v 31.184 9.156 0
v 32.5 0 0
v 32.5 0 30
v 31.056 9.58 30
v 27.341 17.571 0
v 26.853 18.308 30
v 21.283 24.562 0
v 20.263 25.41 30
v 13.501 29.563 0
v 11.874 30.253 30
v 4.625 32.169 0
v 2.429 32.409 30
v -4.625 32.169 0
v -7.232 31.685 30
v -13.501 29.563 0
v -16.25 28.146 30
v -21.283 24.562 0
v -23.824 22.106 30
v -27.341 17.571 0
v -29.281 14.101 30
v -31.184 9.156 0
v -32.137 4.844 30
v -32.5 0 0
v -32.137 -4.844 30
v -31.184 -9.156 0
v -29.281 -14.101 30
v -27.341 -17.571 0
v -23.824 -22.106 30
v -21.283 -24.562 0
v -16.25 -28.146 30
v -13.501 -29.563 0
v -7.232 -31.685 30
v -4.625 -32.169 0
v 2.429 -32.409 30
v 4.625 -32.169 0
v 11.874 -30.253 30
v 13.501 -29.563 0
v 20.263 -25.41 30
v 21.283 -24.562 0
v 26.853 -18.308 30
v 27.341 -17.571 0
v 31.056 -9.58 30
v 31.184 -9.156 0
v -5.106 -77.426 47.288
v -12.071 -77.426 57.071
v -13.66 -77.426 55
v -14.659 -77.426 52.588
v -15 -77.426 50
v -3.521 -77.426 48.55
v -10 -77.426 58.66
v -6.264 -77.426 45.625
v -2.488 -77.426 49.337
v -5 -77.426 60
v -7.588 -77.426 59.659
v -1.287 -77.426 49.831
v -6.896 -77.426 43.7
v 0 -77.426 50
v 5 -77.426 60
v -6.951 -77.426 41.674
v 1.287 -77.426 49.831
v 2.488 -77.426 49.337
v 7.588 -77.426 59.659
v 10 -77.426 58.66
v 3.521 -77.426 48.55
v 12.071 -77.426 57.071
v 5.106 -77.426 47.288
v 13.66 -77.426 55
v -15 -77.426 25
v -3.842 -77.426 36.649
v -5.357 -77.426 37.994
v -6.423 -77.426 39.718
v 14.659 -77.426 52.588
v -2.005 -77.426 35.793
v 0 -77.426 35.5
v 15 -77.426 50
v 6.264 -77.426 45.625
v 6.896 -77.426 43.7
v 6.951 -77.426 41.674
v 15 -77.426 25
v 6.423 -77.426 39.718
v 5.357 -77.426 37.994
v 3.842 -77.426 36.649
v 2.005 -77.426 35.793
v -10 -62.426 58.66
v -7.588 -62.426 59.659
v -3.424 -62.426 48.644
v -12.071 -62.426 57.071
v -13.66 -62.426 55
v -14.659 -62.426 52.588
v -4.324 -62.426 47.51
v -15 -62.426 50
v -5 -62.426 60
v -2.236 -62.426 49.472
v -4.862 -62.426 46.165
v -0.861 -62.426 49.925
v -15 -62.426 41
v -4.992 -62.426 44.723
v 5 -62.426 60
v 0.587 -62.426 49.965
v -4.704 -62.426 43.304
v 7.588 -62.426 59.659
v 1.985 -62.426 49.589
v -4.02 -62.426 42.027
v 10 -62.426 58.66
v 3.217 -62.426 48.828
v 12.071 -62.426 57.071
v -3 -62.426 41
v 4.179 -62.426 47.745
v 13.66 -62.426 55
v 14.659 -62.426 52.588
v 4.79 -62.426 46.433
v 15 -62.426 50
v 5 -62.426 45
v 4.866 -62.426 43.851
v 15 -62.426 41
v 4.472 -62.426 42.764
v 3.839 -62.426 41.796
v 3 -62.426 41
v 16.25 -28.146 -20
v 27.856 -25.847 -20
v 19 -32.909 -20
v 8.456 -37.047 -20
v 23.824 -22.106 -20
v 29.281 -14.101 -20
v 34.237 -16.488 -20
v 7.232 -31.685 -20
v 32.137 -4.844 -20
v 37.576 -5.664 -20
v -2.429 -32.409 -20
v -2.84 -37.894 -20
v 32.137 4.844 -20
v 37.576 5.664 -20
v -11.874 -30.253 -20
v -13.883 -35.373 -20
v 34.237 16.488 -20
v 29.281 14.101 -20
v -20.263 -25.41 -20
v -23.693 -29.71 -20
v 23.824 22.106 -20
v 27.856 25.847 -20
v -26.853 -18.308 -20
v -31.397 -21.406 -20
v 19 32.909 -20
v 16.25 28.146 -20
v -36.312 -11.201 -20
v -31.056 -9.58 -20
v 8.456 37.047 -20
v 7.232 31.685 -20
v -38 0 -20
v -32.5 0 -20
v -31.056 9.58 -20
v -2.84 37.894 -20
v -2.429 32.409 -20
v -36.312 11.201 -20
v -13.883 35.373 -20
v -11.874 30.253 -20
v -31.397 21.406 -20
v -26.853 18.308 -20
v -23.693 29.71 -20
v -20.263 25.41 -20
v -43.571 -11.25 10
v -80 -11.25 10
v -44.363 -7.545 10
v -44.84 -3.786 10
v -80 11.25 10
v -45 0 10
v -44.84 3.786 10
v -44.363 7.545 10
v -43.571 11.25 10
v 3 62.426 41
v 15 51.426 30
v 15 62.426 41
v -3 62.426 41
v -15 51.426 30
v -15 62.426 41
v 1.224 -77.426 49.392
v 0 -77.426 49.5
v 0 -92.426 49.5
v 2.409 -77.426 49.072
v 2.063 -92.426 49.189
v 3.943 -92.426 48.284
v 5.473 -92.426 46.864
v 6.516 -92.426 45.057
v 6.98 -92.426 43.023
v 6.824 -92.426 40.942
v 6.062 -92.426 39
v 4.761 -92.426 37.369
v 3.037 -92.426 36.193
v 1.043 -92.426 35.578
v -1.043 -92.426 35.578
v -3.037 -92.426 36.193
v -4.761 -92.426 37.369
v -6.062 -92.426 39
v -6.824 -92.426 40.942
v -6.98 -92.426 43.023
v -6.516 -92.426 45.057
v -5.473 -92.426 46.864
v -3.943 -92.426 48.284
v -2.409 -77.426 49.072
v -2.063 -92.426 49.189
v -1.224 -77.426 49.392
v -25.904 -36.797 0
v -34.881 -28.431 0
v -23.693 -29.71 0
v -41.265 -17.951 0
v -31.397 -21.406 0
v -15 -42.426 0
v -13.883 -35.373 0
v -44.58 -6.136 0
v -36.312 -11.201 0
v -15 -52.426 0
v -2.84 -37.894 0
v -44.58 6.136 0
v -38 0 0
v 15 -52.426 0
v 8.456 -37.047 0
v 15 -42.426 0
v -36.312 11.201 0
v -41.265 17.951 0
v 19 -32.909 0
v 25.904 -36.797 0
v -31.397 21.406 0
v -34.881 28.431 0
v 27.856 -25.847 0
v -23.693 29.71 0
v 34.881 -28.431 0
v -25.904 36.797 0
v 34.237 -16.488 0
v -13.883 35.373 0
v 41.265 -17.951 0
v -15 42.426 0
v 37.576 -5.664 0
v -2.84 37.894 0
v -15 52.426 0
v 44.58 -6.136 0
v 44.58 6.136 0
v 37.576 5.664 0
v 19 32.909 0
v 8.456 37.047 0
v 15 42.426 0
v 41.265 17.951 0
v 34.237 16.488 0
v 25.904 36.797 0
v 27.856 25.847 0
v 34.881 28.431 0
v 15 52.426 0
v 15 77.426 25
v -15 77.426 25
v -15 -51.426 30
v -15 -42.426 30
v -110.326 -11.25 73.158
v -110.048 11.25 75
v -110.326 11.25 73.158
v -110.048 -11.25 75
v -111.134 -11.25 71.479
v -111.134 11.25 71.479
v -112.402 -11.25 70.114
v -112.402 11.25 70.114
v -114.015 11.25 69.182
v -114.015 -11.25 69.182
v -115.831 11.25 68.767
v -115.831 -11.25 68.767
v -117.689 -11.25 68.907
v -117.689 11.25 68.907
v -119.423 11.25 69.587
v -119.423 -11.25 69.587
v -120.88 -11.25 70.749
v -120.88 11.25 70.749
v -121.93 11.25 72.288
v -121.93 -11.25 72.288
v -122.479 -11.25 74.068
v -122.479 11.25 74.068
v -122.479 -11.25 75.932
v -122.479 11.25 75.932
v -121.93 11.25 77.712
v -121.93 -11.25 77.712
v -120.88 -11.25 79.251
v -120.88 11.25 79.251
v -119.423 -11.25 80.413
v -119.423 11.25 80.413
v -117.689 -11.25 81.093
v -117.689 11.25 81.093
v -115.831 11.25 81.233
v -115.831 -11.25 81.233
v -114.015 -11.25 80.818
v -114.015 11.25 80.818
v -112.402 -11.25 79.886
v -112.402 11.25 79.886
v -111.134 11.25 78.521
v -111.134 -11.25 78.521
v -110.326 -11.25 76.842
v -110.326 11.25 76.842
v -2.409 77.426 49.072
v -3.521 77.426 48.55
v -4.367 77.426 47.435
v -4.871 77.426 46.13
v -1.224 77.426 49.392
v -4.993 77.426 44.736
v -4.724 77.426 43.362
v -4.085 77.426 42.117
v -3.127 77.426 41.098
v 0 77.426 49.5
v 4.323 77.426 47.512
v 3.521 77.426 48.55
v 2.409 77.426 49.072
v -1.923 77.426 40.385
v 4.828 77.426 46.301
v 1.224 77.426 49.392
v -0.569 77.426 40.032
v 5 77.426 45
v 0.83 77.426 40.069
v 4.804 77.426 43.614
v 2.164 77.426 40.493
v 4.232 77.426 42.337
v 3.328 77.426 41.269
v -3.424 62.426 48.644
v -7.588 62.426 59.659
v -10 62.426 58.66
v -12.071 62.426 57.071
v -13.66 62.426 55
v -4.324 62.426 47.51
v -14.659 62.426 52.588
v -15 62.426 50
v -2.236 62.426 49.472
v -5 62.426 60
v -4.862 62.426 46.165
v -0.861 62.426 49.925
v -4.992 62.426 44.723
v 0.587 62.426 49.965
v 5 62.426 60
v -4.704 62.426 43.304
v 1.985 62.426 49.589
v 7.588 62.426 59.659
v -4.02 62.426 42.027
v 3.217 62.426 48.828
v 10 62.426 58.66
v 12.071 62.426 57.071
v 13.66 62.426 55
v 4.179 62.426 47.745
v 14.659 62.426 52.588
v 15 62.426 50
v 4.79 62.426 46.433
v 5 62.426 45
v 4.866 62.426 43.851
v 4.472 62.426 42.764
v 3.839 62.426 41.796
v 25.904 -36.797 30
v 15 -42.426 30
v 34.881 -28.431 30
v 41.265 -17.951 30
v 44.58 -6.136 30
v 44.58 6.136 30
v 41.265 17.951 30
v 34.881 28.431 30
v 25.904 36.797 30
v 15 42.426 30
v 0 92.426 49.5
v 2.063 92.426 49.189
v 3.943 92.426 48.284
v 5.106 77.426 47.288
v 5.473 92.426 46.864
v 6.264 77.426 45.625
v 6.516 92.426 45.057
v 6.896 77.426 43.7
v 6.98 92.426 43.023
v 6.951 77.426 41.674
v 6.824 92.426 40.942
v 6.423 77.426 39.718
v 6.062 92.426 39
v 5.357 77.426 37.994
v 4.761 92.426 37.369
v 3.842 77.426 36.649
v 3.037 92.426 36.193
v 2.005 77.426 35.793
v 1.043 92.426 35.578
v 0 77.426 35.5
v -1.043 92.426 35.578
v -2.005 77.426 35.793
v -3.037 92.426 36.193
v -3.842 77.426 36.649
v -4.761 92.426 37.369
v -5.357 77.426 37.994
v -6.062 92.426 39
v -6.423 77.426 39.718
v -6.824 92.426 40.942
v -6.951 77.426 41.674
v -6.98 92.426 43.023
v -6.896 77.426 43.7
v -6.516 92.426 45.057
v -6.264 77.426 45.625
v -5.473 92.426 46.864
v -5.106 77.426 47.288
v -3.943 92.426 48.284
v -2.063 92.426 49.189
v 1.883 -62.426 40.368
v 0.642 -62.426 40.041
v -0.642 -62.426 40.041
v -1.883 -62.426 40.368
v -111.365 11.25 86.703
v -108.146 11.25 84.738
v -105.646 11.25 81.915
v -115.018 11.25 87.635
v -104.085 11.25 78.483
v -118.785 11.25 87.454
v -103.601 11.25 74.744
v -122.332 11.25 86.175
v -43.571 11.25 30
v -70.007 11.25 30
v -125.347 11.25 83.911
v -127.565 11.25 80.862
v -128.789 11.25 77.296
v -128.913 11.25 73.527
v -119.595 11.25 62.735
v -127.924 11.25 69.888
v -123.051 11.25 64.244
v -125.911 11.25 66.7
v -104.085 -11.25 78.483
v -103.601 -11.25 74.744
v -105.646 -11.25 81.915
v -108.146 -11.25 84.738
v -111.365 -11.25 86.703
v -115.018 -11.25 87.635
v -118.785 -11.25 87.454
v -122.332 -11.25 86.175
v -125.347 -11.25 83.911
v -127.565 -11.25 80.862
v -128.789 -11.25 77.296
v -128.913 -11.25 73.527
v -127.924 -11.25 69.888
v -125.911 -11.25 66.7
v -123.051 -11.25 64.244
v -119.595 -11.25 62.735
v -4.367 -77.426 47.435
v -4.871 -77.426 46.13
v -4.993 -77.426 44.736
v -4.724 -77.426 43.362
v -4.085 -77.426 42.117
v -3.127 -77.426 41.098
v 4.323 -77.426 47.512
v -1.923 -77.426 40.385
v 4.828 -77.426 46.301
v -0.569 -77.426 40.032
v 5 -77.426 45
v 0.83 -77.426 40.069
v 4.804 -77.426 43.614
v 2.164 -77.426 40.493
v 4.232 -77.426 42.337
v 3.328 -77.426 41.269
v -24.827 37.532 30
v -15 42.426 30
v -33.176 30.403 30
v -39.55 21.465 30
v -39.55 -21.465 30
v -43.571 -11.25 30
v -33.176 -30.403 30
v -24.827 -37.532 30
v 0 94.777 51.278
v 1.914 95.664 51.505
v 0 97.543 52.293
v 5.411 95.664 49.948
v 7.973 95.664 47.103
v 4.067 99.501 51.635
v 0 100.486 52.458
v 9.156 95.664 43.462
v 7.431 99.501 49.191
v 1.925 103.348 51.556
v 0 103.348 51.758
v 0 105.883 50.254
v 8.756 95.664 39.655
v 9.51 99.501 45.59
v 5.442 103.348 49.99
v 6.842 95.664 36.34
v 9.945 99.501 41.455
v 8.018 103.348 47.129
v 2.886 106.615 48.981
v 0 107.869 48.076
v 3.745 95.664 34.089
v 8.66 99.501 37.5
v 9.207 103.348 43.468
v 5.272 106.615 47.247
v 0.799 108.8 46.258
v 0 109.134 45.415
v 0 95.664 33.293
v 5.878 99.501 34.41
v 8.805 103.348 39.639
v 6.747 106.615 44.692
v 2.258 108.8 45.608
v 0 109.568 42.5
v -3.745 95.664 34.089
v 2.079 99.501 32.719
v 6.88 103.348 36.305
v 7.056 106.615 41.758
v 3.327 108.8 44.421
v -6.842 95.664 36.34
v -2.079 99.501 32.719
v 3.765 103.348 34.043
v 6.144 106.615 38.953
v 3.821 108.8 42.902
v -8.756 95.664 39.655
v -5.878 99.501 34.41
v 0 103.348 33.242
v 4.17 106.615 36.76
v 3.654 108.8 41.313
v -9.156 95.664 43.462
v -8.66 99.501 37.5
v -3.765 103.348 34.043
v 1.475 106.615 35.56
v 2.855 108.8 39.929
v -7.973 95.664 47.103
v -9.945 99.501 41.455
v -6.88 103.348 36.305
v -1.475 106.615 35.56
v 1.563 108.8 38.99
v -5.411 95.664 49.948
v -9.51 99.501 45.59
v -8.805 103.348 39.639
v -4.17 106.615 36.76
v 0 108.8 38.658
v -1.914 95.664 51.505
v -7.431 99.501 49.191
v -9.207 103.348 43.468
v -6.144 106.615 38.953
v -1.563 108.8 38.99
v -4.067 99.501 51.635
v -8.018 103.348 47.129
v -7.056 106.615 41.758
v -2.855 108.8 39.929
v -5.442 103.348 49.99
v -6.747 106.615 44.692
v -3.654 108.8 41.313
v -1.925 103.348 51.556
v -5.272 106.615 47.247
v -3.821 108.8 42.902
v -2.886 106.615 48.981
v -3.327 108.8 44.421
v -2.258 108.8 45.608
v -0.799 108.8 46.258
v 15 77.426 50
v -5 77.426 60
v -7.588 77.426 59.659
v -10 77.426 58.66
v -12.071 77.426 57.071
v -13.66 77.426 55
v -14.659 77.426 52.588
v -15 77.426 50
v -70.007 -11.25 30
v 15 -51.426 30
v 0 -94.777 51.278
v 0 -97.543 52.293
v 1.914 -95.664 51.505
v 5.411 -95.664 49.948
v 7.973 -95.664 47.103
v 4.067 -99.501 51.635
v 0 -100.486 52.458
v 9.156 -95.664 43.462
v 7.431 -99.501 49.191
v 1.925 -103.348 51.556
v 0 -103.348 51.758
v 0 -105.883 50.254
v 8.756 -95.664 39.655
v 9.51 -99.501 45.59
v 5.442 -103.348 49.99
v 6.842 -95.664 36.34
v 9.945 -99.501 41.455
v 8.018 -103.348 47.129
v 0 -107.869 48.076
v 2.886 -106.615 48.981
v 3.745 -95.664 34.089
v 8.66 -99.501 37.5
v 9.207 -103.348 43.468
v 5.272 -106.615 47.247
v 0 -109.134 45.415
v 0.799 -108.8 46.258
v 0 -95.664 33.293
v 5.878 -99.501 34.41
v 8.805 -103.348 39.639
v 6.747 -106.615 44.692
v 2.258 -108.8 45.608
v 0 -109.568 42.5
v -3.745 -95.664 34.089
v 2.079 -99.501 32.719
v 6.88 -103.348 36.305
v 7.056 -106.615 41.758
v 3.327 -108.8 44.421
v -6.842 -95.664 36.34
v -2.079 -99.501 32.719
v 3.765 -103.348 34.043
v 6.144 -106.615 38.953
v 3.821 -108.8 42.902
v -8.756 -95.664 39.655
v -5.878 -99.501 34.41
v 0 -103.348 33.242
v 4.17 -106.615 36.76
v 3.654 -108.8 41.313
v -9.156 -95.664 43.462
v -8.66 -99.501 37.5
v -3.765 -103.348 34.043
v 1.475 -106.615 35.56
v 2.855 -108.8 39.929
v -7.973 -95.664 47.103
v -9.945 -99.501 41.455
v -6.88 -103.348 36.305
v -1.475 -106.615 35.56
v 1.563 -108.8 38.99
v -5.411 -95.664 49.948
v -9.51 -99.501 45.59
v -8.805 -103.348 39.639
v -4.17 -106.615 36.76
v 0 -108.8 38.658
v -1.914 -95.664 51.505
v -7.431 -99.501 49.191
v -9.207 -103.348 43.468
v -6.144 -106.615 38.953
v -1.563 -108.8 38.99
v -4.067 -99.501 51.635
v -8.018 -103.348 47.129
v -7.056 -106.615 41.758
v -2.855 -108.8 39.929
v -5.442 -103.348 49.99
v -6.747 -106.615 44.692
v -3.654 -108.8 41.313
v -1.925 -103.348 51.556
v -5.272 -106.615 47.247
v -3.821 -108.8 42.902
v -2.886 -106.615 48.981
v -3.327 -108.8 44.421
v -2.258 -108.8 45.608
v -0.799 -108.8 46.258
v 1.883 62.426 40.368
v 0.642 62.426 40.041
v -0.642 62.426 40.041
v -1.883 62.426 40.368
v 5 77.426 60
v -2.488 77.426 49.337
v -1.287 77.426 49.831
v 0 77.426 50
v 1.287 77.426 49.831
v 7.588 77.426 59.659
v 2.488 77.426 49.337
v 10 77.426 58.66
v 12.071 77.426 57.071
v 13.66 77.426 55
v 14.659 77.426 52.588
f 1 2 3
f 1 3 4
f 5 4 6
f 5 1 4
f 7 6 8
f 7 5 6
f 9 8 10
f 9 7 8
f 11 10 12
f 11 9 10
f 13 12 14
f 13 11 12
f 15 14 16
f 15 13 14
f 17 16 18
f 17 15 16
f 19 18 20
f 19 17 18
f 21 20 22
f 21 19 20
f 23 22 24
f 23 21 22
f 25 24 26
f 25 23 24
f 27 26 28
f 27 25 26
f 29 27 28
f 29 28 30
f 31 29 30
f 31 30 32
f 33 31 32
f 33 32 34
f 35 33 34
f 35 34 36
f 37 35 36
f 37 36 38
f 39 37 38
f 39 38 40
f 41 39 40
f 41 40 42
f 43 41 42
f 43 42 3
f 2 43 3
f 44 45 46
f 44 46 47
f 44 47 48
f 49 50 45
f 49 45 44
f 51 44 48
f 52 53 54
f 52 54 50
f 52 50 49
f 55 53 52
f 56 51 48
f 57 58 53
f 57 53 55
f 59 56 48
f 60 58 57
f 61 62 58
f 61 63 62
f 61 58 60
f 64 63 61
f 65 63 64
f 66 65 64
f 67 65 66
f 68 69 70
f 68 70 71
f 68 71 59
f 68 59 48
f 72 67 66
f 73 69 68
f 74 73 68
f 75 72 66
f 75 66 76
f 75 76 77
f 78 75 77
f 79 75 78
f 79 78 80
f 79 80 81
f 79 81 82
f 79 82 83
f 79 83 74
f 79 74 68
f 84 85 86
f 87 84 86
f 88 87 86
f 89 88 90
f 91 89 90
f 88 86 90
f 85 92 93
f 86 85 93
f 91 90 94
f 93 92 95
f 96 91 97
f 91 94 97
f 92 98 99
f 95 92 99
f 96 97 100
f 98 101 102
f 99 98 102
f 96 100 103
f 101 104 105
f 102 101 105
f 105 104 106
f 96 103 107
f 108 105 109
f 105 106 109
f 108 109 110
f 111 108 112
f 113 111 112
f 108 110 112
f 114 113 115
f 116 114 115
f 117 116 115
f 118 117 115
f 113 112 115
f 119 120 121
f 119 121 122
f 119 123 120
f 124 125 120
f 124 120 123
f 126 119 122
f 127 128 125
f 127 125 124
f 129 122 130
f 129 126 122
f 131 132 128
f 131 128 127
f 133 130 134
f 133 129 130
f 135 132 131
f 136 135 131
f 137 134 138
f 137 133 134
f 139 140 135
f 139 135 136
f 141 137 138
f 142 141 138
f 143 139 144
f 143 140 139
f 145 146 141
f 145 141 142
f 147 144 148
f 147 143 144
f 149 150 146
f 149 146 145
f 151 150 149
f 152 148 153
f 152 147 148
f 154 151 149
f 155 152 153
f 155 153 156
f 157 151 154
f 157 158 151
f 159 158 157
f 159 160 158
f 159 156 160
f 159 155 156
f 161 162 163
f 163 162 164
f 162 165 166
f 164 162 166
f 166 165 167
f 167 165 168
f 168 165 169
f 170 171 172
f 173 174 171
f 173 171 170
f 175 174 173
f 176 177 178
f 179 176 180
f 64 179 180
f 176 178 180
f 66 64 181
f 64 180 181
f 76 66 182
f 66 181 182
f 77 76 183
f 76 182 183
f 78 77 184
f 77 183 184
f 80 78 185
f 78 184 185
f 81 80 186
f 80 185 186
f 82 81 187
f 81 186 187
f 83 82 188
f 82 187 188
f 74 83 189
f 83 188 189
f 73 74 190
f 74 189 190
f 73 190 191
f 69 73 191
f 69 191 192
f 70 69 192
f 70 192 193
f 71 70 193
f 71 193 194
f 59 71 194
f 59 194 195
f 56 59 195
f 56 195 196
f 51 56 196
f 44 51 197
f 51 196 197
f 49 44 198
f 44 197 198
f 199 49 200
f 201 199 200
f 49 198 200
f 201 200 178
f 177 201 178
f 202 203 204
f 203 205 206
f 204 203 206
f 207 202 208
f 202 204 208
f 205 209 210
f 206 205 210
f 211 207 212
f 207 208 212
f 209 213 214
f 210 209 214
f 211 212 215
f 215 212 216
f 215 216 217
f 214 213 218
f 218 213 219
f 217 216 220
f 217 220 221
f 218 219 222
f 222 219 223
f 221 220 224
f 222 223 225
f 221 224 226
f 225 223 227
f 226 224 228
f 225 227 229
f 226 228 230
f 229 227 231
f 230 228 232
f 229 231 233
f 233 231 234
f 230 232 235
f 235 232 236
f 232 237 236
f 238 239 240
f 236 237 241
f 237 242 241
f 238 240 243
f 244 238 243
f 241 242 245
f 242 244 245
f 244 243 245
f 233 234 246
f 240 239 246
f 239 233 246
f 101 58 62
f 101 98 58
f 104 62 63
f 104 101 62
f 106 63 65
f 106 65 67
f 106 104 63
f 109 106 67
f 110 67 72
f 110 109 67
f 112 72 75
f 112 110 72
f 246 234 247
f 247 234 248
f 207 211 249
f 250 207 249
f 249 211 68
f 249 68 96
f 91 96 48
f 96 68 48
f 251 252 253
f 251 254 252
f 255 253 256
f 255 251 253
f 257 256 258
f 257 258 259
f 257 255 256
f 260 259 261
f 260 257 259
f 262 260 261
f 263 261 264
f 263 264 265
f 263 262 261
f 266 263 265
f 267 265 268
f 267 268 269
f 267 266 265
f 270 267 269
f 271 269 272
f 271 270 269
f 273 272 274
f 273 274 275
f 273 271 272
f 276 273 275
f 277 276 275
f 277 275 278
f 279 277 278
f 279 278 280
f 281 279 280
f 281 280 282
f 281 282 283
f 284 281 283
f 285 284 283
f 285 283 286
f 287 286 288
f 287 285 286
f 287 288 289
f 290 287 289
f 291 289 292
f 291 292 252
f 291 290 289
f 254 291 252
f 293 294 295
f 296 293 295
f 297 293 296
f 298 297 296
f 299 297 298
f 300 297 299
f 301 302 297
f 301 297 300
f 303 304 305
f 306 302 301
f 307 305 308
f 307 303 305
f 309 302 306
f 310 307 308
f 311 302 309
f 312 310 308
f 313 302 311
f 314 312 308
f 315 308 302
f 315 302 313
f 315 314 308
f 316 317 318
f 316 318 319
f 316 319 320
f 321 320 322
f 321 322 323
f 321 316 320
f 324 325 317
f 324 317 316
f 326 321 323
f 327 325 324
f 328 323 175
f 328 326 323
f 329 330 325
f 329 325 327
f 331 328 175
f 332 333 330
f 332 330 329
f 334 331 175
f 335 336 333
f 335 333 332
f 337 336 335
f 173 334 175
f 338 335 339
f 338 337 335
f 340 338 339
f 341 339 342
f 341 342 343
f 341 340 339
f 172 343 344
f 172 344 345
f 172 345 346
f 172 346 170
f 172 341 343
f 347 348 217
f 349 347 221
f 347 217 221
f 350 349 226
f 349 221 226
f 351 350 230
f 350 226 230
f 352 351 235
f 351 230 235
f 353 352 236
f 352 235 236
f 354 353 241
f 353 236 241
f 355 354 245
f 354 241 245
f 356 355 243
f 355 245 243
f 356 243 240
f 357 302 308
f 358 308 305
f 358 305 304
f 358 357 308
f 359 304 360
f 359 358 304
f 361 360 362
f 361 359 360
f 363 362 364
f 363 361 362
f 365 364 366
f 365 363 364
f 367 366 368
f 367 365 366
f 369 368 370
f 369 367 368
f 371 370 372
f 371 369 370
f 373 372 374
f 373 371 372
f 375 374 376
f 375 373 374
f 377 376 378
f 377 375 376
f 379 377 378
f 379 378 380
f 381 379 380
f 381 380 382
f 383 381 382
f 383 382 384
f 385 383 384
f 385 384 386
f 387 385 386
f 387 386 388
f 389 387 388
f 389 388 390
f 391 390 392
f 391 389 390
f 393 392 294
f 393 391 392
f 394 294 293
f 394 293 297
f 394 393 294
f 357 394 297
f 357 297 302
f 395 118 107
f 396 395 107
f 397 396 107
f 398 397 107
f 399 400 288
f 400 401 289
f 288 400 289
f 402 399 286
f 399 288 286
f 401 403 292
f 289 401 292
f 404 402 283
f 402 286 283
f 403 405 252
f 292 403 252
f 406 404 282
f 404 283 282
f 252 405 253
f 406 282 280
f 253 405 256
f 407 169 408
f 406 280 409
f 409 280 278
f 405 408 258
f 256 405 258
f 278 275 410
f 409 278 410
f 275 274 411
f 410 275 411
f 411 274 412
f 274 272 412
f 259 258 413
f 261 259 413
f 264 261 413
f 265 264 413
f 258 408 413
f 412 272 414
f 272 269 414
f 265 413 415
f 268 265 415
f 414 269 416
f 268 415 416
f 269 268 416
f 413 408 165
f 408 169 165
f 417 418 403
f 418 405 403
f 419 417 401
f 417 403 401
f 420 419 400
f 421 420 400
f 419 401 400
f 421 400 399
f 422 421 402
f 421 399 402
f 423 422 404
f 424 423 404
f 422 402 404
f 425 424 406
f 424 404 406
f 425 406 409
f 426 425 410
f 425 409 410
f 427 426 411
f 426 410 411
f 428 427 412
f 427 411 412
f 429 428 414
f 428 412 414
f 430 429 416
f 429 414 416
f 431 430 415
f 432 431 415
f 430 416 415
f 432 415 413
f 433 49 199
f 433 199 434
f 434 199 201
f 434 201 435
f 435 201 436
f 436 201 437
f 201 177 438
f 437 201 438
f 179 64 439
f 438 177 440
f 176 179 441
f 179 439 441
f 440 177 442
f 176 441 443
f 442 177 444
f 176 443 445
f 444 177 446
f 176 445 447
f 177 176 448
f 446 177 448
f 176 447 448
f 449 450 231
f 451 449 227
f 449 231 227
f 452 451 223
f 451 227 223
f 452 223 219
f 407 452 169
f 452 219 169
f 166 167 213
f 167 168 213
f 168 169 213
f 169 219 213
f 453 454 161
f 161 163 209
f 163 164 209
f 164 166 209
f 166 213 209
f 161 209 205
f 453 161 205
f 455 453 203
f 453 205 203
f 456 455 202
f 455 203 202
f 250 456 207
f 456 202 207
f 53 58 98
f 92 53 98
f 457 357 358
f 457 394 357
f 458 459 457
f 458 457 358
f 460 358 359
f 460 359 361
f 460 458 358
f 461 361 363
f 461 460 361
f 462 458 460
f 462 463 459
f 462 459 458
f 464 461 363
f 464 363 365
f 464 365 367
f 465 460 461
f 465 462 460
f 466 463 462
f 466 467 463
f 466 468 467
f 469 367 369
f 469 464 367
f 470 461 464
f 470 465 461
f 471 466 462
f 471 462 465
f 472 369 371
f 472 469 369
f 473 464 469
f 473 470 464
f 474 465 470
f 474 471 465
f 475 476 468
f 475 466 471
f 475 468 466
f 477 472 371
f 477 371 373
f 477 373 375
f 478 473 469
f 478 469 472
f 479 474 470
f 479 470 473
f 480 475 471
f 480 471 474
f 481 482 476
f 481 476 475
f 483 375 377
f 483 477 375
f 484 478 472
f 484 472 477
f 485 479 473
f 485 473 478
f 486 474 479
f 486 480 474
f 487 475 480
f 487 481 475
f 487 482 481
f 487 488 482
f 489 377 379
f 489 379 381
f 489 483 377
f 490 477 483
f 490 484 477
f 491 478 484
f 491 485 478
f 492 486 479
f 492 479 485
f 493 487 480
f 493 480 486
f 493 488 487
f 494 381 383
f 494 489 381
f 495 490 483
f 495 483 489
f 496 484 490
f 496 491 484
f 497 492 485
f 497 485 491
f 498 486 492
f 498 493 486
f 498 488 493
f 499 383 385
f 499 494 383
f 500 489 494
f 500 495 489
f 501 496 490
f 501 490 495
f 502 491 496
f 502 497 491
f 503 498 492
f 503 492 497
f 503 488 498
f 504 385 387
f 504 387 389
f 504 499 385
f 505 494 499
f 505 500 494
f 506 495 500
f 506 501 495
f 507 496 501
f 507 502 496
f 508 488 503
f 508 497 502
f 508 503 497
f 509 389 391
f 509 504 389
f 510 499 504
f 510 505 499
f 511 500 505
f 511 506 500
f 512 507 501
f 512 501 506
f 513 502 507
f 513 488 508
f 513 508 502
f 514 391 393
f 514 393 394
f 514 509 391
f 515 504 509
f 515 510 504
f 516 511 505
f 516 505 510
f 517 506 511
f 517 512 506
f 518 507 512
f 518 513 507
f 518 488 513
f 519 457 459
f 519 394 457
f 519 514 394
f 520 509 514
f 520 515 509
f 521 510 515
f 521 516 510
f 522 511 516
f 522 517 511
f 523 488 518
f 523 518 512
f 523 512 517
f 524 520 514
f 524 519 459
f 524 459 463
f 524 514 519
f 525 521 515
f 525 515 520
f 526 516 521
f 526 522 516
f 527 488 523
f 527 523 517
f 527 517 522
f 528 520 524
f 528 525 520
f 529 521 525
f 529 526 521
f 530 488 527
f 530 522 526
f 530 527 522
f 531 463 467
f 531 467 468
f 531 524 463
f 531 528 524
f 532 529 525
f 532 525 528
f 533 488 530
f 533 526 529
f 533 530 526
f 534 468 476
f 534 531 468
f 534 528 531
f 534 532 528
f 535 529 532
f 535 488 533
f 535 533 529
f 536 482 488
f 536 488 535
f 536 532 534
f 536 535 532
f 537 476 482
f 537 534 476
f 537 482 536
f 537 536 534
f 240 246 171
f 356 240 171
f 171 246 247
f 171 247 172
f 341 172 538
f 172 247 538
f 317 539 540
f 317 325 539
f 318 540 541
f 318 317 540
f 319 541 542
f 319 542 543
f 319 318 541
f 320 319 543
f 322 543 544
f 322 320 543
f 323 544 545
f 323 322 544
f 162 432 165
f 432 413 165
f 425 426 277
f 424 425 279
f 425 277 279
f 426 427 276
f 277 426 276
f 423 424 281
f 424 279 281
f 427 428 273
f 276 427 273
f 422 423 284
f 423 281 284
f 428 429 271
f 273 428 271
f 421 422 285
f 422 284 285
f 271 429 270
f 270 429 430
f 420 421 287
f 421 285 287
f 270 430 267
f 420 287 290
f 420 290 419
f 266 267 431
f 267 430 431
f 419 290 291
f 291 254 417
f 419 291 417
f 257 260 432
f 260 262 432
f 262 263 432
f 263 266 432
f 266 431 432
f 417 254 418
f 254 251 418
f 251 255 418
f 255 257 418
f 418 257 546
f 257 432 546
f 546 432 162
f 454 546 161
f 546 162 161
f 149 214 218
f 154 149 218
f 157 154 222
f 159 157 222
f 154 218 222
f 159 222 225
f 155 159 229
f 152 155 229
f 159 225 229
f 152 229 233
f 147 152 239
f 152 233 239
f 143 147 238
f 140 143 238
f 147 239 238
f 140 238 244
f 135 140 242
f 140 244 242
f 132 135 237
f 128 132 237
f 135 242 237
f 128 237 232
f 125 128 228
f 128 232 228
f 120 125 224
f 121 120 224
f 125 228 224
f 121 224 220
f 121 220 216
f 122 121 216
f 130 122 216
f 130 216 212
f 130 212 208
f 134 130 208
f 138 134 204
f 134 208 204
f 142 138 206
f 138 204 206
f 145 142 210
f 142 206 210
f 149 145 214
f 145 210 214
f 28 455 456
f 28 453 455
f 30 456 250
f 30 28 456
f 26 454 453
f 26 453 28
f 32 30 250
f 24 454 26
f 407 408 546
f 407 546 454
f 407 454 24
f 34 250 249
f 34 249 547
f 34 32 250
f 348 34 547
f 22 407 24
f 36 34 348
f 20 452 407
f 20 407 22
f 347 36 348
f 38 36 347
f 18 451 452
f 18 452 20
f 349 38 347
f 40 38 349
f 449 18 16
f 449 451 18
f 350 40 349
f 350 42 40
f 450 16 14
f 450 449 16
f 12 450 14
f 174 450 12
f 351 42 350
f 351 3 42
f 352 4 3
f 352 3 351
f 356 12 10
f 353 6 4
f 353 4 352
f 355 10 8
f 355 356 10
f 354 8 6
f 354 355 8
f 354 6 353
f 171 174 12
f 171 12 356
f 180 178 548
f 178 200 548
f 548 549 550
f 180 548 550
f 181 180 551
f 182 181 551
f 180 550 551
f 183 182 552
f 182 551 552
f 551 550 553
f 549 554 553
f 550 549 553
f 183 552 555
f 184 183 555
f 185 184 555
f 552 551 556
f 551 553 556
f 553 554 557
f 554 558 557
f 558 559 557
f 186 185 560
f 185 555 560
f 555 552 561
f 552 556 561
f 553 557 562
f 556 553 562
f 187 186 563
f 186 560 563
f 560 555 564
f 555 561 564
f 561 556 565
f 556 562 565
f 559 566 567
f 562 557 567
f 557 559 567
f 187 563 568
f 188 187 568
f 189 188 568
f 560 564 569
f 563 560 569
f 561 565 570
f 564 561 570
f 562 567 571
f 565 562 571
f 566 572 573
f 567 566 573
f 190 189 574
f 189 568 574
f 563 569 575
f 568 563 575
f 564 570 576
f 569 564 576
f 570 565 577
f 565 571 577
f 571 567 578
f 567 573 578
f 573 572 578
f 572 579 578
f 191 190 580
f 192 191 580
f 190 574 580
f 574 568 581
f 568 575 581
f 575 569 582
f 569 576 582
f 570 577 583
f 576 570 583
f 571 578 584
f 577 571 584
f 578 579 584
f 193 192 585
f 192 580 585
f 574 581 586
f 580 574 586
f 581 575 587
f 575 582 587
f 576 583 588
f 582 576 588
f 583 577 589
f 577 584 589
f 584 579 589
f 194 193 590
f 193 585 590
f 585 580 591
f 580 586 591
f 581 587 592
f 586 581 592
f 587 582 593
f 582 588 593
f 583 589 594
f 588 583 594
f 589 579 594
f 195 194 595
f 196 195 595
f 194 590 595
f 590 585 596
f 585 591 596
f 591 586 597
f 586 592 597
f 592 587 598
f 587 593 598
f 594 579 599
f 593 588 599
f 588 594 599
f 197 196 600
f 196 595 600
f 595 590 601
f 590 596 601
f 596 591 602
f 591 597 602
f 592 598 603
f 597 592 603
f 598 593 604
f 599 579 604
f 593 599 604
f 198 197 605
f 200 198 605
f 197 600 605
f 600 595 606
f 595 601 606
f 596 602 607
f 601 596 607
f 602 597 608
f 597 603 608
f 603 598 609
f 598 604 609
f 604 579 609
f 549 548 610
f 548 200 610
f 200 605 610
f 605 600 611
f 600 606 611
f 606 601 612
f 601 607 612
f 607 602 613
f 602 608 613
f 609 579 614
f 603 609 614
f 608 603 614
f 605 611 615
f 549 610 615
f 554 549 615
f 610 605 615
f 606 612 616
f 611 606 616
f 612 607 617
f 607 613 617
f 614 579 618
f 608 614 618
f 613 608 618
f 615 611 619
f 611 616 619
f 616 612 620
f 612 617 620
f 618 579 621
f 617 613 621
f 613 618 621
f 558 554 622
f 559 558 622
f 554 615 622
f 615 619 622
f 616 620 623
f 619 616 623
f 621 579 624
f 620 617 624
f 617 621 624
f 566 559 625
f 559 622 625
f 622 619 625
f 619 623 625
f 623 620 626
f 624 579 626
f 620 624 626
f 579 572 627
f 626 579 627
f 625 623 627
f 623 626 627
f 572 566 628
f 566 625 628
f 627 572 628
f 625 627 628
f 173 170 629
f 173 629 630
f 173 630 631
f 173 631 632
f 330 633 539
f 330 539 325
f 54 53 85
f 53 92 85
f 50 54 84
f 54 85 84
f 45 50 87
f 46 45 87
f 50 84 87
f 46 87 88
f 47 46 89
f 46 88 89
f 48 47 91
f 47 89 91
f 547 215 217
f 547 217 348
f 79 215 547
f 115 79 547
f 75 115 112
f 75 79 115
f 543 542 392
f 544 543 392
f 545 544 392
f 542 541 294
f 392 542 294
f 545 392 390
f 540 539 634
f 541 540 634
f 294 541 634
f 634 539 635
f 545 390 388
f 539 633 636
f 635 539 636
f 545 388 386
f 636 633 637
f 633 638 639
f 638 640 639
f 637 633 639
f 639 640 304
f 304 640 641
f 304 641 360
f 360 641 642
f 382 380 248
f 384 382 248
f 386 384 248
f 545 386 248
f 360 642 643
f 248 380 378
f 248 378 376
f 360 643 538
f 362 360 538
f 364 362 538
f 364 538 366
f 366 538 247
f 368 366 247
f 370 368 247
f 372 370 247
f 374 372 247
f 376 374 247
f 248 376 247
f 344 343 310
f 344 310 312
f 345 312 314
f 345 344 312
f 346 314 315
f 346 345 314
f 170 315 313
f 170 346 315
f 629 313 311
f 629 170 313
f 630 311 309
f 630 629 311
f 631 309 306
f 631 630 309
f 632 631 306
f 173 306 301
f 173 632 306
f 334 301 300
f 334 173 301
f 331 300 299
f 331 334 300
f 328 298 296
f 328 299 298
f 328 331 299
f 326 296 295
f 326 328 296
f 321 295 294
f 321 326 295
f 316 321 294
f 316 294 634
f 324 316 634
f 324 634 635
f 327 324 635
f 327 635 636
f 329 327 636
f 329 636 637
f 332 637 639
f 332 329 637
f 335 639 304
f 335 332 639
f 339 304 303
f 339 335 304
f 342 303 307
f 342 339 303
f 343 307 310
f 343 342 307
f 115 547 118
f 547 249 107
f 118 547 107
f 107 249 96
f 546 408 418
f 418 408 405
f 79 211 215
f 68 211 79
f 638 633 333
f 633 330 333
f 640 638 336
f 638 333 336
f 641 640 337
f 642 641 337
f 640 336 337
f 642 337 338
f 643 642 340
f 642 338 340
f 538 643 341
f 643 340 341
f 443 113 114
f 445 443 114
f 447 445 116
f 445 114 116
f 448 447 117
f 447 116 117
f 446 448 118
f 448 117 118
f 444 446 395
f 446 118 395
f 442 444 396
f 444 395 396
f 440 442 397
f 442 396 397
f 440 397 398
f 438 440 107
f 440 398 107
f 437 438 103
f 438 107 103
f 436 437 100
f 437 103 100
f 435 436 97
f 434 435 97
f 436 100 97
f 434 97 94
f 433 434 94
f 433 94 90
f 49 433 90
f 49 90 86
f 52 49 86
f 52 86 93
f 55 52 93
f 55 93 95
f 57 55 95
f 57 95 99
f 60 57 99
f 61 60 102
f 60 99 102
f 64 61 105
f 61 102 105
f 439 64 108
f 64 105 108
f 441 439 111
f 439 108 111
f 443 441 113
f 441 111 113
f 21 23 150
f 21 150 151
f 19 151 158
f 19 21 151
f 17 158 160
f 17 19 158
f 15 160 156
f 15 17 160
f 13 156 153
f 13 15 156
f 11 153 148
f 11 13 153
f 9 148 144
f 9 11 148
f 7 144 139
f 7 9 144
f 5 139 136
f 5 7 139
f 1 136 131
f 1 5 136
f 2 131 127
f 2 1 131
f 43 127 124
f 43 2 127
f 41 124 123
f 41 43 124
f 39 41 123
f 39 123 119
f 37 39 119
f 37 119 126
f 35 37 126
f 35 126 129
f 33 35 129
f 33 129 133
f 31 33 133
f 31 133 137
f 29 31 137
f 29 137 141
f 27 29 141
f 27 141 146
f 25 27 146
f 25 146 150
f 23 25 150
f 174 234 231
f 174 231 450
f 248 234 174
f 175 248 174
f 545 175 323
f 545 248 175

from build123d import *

# Parameters (mm, degrees)
CROQUIS1_R               = 45
CROQUIS1_R_2             = 32.5
SALIENTE_EXTRUIR1_DEPTH  = 30
SALIENTE_EXTRUIR2_DEPTH  = 30
CROQUIS3_W               = 60
CROQUIS3_H               = 15
SALIENTE_EXTRUIR3_DEPTH  = 15
REDONDEO1_R              = 10
REDONDEO2_R              = 15
CROQUIS4_R               = 5
CORTAR_EXTRUIR1_DEPTH    = 16
REDONDEO1_OF_SIMETR_A1_R = 10
REDONDEO2_OF_SIMETR_A1_R = 15
CROQUIS8_R               = 6.25
SALIENTE_EXTRUIR4_DEPTH  = 11.25
SALIENTE_EXTRUIR5_START  = 10
SALIENTE_EXTRUIR5_DEPTH  = 20
CORTAR_EXTRUIR2_DEPTH    = 61
CROQUIS12_R              = 38
CROQUIS12_R_2            = 32.5
SALIENTE_EXTRUIR7_DEPTH  = 20
SALIENTE_EXTRUIR9_DEPTH  = 30


with BuildPart() as part:
    # Croquis1 → Saliente-Extruir1 (new body)
    with BuildSketch(Plane.XY):
        Circle(CROQUIS1_R)
        Circle(CROQUIS1_R_2, mode=Mode.SUBTRACT)
    extrude(amount=SALIENTE_EXTRUIR1_DEPTH)

    # Croquis2 → Saliente-Extruir2 (add)
    with BuildSketch(Plane.XY):
        with BuildLine():
            Line((-15, -42.426406871), (-15, -77.426406871))
            Line((-15, -77.426406871), (15, -77.426406871))
            Line((15, -77.426406871), (15, -42.426406871))
            ThreePointArc((15, -42.426406871), (0, -45), (-15, -42.426406871))
        make_face()
    saliente_extruir2 = extrude(amount=SALIENTE_EXTRUIR2_DEPTH)

    # Croquis3 → Saliente-Extruir3 (add, symmetric)
    with BuildSketch(Plane(origin=(0, 0, 0), x_dir=(0, 0, -1), z_dir=(1, 0, 0))):
        with Locations((-30, -69.926406871)):
            Rectangle(CROQUIS3_W, CROQUIS3_H)
    saliente_extruir3 = extrude(amount=SALIENTE_EXTRUIR3_DEPTH, both=True)

    # Redondeo1
    redondeo1_edges = [part.edges().sort_by_distance(p)[0] for p in [
        (-15, -69.926406871, 60),
        (15, -69.926406871, 60),
    ]]
    fillet(redondeo1_edges, radius=REDONDEO1_R)

    # Redondeo2
    redondeo2_edges = [part.edges().sort_by_distance(p)[0] for p in [
        (0, -77.426406871, 0),
    ]]
    fillet(redondeo2_edges, radius=REDONDEO2_R)

    # Croquis4 → Cortar-Extruir1 (cut, through all)
    with BuildSketch(Plane(origin=(0, -62.426406871, 0), x_dir=(1, 0, 0), z_dir=(0, 1, 0))):
        with Locations((0, -45)):
            Circle(CROQUIS4_R)
    cortar_extruir1 = extrude(amount=-CORTAR_EXTRUIR1_DEPTH, mode=Mode.SUBTRACT)

    # Simetría1: Saliente-Extruir2, Saliente-Extruir3, Cortar-Extruir1 across plane
    add(saliente_extruir2.mirror(Plane.ZX))
    add(saliente_extruir3.mirror(Plane.ZX))
    add(cortar_extruir1.mirror(Plane.ZX), mode=Mode.SUBTRACT)

    # Redondeo1 of Simetría1
    redondeo1_of_simetr_a1_edges = [part.edges().sort_by_distance(p)[0] for p in [
        (-15, 69.926406871, 60),
        (15, 69.926406871, 60),
    ]]
    fillet(redondeo1_of_simetr_a1_edges, radius=REDONDEO1_OF_SIMETR_A1_R)

    # Redondeo2 of Simetría1
    redondeo2_of_simetr_a1_edges = [part.edges().sort_by_distance(p)[0] for p in [
        (0, 77.426406871, 0),
    ]]
    fillet(redondeo2_of_simetr_a1_edges, radius=REDONDEO2_OF_SIMETR_A1_R)



with BuildPart() as body_2:
    # Croquis8 → Saliente-Extruir4 (new body, symmetric)
    with BuildSketch(Plane(origin=(0, 0, 0), x_dir=(1, 0, 0), z_dir=(0, 1, 0))):
        with BuildLine():
            Line((-45, -30), (-70.006566453, -30))
            Line((-70.006566453, -30), (-103.60103907, -74.743636588))
            ThreePointArc((-103.60103907, -74.743636588), (-123.92378818, -85.155995163), (-119.59473224, -62.735232082))
            Line((-119.59473224, -62.735232082), (-80, -10))
            Line((-80, -10), (-45, -10))
            Line((-45, -10), (-45, -30))
        make_face()
        with Locations((-116.298451318, -75)):
            Circle(CROQUIS8_R, mode=Mode.SUBTRACT)
    extrude(amount=SALIENTE_EXTRUIR4_DEPTH, both=True)


with BuildPart() as part_1:
    add(part.part)

    add(body_2.part)  # Saliente-Extruir5 merges body 2
    # Croquis9 → Saliente-Extruir5 (add)
    with BuildSketch(Plane.XY.offset(SALIENTE_EXTRUIR5_START)):
        with BuildLine():
            Line((-43.571062645, 11.25), (-45, 11.25))
            Line((-45, 11.25), (-45, 0))
            ThreePointArc((-45, 0), (-44.641336332, 5.670193162), (-43.571062645, 11.25))
        make_face()
        with BuildLine():
            ThreePointArc((-43.571062645, -11.25), (-44.641336332, -5.670193162), (-45, 0))
            Line((-45, 0), (-45, -11.25))
            Line((-45, -11.25), (-43.571062645, -11.25))
        make_face()
    extrude(amount=SALIENTE_EXTRUIR5_DEPTH)

    # Croquis11 → Cortar-Extruir2 (cut, through all)
    with BuildSketch(Plane.ZY.offset(15)):
        with BuildLine():
            Line((0, 62.426406871), (0, 52.426406871))
            Line((0, 52.426406871), (25, 77.426406871))
            Line((25, 77.426406871), (15, 77.426406871))
            ThreePointArc((15, 77.426406871), (4.393398282, 73.033008589), (0, 62.426406871))
        make_face()
    cortar_extruir2 = extrude(amount=-CORTAR_EXTRUIR2_DEPTH, mode=Mode.SUBTRACT)

    # Simetría2: Cortar-Extruir2 across plane
    add(cortar_extruir2.mirror(Plane.ZX), mode=Mode.SUBTRACT)

    # Croquis12 → Saliente-Extruir7 (add)
    with BuildSketch(Plane(origin=(0, 0, 0), x_dir=(-1, 0, 0), z_dir=(0, 0, -1))):
        Circle(CROQUIS12_R)
        Circle(CROQUIS12_R_2, mode=Mode.SUBTRACT)
    extrude(amount=SALIENTE_EXTRUIR7_DEPTH)

    # Croquis13 → Saliente-Extruir9 (add)
    with BuildSketch(Plane.ZY.offset(15)):
        Polygon((30, 62.426406871), (30, 51.426406871), (41, 62.426406871), align=None)
    saliente_extruir9 = extrude(amount=-SALIENTE_EXTRUIR9_DEPTH)

    # Simetría3: Saliente-Extruir9 across plane
    add(saliente_extruir9.mirror(Plane.ZX))

    # Croquis14 → Revolución1 (revolve)
    with BuildSketch(Plane(origin=(0, 0, 0), x_dir=(0, 0, -1), z_dir=(1, 0, 0))):
        with BuildLine():
            Line((-49.5, 77.426406871), (-49.5, 92.426406871))
            ThreePointArc((-49.5, 92.426406871), (-51.757815193, 103.348424917), (-42.5, 109.5678353))
            Line((-42.5, 109.5678353), (-42.5, 77.426406871))
            Line((-42.5, 77.426406871), (-49.5, 77.426406871))
        make_face()
    revoluci_n1 = revolve(axis=Axis((0, 77.426406871, 42.5), (0, 1, 0)))

    # Simetría4: Revolución1 across plane
    add(revoluci_n1.mirror(Plane.ZX))


solid = part_1.part
